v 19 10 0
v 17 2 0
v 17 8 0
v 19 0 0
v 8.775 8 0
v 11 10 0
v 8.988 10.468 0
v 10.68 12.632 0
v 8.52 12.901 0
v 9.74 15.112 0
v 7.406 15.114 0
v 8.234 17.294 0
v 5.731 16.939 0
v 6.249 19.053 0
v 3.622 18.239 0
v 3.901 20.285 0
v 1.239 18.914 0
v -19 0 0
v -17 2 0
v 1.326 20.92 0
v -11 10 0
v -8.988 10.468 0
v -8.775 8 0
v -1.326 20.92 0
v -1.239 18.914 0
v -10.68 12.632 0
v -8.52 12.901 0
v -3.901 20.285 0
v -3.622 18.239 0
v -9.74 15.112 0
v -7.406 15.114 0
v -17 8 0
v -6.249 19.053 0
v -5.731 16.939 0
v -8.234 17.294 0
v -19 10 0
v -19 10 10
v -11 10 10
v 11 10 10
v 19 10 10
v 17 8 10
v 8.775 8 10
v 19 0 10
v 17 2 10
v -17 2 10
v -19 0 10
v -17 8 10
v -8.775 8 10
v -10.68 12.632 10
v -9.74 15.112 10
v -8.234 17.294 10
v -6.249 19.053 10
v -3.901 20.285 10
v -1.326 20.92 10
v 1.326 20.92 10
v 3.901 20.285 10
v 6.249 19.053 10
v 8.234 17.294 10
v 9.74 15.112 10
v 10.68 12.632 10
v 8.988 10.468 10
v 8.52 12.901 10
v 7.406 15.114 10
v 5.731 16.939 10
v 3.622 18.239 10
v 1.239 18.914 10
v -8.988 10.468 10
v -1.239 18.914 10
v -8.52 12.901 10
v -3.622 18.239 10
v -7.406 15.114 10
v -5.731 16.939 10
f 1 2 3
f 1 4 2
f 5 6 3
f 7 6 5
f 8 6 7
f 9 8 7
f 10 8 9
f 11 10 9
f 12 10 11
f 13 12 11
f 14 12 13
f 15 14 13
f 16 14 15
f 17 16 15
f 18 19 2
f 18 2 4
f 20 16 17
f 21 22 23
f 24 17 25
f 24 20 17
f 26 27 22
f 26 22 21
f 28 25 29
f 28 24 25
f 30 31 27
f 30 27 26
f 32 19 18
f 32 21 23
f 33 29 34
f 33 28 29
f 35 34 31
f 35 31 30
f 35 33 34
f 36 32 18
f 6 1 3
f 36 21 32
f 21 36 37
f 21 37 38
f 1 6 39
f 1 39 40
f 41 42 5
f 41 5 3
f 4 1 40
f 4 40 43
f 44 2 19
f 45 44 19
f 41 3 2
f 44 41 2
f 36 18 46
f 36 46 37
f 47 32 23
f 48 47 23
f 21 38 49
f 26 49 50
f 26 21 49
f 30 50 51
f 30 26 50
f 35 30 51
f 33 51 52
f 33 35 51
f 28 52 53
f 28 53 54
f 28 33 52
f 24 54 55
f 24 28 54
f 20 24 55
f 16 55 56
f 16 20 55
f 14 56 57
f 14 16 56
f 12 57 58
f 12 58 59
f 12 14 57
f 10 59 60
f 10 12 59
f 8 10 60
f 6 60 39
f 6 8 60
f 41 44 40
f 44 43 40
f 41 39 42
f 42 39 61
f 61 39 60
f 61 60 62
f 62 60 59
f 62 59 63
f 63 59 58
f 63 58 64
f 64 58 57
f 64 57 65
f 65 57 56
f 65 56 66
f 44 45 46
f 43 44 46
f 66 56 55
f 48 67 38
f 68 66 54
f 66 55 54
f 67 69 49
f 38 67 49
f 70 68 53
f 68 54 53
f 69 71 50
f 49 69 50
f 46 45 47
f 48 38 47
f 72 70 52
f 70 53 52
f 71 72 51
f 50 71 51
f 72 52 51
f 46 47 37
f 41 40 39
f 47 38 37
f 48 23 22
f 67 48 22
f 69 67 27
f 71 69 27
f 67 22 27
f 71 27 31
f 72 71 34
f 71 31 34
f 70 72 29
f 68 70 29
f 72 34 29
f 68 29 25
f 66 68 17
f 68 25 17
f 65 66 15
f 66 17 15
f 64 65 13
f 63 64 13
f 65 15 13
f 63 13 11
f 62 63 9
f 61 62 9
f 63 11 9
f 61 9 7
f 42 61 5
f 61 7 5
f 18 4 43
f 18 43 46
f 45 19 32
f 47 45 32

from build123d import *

# Parameters (mm, degrees)
EXTRUDE_THIN1_DEPTH = 10


with BuildPart() as part:
    # Sketch1 → Extrude-Thin1 (new body)
    with BuildSketch(Plane.XY):
        with BuildLine():
            Line((11, 10), (19, 10))
            Line((19, 10), (19, 0))
            Line((19, 0), (-19, 0))
            Line((-19, 0), (-19, 10))
            Line((-19, 10), (-11, 10))
            ThreePointArc((-11, 10), (0, 21), (11, 10))
        make_face()
        with BuildLine():
            Line((8.774964387, 8), (17, 8))
            Line((17, 8), (17, 2))
            Line((17, 2), (-17, 2))
            Line((-17, 2), (-17, 8))
            Line((-17, 8), (-8.774964387, 8))
            ThreePointArc((-8.774964387, 8), (0, 19), (8.774964387, 8))
        make_face(mode=Mode.SUBTRACT)
    extrude(amount=EXTRUDE_THIN1_DEPTH)


solid = part.part
